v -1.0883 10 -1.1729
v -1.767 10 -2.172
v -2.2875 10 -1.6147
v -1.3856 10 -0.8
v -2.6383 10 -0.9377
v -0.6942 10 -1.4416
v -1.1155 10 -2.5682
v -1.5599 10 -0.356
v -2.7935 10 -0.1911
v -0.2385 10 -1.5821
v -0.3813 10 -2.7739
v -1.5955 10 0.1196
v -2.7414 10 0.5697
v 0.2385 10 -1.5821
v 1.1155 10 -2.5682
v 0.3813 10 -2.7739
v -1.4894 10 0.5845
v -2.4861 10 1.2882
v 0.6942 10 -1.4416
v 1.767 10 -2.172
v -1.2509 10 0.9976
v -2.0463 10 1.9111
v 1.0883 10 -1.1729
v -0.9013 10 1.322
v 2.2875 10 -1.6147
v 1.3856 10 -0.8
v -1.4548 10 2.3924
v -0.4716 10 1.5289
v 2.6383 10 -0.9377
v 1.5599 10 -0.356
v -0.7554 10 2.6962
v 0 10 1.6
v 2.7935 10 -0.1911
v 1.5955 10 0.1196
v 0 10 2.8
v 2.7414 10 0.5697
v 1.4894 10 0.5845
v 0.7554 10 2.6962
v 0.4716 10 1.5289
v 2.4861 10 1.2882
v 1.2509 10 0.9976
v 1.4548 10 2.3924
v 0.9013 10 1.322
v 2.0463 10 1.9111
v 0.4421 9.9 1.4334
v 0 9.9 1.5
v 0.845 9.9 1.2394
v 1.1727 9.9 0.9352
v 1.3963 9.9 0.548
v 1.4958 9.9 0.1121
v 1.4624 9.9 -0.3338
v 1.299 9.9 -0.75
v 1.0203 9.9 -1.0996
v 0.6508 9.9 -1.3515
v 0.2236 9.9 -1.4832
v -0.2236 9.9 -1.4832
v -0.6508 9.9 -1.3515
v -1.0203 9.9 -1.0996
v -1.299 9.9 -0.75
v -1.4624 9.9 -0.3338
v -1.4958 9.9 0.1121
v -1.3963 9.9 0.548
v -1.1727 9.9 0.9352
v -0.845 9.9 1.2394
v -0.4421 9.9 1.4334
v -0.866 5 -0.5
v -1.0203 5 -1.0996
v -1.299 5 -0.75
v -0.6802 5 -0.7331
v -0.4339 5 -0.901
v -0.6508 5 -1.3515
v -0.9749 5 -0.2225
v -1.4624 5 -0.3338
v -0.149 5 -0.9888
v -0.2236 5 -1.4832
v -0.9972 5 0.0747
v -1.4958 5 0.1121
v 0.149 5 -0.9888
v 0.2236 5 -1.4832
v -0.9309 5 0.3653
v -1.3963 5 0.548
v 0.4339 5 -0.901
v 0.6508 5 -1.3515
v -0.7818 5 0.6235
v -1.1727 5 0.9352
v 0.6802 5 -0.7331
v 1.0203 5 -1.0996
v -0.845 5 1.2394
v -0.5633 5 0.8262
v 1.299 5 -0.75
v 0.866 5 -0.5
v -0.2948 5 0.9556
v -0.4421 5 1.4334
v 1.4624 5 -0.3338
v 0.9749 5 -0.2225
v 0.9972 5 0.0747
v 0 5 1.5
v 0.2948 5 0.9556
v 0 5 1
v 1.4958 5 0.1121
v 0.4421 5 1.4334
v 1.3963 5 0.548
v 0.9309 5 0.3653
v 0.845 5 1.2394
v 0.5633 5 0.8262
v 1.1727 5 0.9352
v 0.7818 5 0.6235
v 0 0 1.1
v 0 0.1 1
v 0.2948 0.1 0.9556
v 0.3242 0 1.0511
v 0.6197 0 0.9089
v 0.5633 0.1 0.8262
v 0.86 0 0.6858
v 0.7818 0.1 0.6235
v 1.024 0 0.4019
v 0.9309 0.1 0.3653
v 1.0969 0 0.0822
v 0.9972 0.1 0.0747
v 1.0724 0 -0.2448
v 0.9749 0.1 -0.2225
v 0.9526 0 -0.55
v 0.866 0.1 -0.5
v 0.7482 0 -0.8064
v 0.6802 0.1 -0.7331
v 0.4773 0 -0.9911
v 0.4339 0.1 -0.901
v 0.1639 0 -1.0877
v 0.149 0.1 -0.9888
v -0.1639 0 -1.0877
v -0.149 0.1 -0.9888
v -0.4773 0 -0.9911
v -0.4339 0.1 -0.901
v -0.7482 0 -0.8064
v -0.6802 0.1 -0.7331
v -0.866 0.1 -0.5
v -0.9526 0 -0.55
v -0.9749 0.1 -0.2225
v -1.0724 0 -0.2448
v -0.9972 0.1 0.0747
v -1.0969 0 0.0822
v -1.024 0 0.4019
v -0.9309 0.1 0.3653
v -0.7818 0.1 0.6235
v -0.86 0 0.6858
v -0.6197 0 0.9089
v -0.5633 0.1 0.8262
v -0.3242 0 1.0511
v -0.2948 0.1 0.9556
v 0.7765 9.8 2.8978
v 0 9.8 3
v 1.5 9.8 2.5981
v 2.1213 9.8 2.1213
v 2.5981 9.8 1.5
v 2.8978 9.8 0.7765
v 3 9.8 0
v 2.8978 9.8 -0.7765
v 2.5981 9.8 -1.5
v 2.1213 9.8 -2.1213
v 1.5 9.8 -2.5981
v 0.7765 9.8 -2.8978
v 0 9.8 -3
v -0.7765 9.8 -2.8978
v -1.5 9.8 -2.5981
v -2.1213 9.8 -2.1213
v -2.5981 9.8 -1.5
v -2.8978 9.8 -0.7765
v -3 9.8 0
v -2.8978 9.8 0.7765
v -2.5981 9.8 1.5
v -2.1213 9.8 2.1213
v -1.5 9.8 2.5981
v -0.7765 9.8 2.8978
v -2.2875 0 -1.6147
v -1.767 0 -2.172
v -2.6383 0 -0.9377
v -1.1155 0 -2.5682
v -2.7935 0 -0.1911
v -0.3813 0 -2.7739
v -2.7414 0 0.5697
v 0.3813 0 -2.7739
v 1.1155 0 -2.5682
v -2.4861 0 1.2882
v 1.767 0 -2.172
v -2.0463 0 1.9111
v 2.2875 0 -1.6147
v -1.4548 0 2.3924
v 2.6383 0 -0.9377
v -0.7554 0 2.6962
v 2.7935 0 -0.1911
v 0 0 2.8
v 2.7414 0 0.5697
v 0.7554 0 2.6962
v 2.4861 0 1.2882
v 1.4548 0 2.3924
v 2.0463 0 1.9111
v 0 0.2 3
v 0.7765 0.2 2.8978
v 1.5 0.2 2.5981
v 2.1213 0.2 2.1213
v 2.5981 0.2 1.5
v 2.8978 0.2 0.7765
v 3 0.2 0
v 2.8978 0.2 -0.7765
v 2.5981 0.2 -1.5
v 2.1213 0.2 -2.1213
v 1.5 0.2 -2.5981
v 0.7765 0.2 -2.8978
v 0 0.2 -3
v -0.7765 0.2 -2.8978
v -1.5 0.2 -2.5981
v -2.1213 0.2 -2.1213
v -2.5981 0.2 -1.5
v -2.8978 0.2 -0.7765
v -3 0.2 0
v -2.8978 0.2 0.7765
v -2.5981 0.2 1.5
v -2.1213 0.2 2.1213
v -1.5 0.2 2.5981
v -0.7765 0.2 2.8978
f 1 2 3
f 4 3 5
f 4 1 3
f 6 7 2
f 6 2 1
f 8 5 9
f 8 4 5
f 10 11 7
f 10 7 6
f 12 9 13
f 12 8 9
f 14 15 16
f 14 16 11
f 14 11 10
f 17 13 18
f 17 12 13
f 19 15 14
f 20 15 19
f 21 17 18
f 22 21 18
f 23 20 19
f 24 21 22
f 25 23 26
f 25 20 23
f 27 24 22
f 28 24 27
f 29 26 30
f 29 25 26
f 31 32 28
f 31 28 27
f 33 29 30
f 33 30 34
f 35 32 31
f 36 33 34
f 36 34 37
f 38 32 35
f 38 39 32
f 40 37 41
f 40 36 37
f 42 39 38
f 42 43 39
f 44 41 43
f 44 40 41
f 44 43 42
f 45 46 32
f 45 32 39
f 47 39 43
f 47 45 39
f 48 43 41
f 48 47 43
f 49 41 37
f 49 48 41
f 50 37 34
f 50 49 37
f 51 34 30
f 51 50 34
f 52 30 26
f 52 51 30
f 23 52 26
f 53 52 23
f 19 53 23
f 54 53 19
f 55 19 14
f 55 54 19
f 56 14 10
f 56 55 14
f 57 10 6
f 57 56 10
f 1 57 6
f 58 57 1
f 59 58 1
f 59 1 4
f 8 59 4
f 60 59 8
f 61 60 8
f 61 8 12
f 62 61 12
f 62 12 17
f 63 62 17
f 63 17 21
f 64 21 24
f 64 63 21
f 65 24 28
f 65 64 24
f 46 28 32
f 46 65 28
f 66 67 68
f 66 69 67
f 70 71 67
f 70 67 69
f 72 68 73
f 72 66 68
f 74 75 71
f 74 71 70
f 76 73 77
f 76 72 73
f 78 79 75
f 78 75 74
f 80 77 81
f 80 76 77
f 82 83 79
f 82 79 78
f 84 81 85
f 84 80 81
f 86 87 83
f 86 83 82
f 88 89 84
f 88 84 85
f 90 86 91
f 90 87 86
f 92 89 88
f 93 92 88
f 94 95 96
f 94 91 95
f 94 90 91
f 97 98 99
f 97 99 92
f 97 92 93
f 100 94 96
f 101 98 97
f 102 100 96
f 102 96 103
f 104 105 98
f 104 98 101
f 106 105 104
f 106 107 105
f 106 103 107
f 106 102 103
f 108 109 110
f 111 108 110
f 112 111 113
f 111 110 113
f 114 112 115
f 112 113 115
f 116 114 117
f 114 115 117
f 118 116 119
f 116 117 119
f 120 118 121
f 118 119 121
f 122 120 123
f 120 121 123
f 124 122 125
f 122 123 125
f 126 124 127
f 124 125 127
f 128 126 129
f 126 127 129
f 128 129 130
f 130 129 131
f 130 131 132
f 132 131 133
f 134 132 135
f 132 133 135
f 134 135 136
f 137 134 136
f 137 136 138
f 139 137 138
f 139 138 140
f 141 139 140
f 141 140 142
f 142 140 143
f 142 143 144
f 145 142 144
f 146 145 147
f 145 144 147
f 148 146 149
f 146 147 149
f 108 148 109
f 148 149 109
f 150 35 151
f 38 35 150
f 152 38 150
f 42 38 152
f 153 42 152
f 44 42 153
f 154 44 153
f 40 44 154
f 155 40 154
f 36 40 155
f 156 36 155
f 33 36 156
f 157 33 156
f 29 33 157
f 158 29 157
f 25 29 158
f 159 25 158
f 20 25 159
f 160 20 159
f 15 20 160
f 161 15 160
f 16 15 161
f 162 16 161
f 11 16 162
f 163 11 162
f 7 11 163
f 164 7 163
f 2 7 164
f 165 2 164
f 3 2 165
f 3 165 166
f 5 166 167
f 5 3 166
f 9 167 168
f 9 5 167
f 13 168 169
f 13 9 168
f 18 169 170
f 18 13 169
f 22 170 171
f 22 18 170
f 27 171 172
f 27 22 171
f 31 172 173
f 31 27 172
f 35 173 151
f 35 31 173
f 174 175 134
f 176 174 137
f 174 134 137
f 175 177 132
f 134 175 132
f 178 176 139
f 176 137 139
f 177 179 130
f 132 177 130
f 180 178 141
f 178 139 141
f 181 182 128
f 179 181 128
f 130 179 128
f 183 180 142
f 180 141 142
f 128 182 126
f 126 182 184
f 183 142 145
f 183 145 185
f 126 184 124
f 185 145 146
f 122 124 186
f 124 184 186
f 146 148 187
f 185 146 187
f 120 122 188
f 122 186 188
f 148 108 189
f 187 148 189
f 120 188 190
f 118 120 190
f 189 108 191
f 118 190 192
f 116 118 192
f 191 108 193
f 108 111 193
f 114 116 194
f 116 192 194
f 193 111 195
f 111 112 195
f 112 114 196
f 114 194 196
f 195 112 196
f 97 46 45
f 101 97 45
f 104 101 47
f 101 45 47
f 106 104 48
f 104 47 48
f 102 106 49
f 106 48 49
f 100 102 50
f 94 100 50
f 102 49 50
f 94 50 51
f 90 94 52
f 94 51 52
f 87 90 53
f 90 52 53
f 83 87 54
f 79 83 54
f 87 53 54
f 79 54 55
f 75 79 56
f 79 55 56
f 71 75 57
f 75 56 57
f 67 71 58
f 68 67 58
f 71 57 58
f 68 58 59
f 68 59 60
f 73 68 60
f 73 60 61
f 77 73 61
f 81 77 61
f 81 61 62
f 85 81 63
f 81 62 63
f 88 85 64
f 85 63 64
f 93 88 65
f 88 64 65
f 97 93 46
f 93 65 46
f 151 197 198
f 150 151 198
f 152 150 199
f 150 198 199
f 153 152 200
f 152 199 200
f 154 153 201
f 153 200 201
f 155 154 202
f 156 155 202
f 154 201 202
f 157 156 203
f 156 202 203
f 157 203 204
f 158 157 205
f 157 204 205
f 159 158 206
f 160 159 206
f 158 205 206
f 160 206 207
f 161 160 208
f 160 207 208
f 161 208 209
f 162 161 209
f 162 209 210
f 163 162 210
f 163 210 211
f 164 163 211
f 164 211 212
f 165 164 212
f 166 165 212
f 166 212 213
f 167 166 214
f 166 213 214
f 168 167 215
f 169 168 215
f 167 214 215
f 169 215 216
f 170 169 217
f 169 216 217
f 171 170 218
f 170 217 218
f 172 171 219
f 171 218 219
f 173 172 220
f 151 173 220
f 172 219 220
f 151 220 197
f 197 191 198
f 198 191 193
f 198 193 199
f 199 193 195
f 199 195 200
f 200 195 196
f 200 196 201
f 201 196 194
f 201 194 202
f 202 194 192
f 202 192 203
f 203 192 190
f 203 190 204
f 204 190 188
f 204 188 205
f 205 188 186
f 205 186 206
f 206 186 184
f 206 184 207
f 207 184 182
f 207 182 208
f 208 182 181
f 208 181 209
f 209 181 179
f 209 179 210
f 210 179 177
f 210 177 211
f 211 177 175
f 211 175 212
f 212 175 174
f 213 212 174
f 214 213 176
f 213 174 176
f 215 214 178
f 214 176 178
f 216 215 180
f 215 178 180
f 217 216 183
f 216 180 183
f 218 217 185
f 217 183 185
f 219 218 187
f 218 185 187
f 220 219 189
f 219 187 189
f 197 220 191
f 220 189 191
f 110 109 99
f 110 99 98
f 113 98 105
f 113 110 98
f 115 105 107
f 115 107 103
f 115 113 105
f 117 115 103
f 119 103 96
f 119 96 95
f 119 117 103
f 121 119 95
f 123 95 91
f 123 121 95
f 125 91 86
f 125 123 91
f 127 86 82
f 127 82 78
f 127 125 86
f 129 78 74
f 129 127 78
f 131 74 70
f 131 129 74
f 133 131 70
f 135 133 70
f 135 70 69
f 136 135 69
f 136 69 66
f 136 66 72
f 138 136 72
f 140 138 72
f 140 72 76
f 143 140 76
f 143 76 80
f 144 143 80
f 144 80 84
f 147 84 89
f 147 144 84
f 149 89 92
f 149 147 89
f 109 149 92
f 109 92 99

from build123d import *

# Parameters (mm, degrees)
SKETCH_1_R          = 3
EXTRUDE_1_DEPTH     = 10
SKETCH_2_R          = 1
CUT_EXTRUDE_1_DEPTH = 5
CUT_EXTRUDE_START   = 10
SKETCH_3_R          = 1.5
CUT_EXTRUDE_2_DEPTH = 5
CHAMFER_1_SIZE      = 0.2
CHAMFER_2_SIZE      = 0.1


with BuildPart() as part:
    # 草图1 → 凸台-拉伸1 (new body)
    with BuildSketch(Plane(origin=(0, 0, 0), x_dir=(1, 0, 0), z_dir=(0, 1, 0))):
        with Locations(Location((0, 0, 0), (0, 0, 270))):
            Circle(SKETCH_1_R)
    extrude(amount=EXTRUDE_1_DEPTH)

    # 草图2 → 切除-拉伸1 (cut)
    with BuildSketch(Plane(origin=(0, 0, 0), x_dir=(1, 0, 0), z_dir=(0, 1, 0))):
        with Locations(Location((0, 0, 0), (0, 0, 270))):
            Circle(SKETCH_2_R)
    extrude(amount=CUT_EXTRUDE_1_DEPTH, mode=Mode.SUBTRACT)

    # 草图3 → 切除-拉伸2 (cut)
    with BuildSketch(Plane(origin=(0, 0, 0), x_dir=(1, 0, 0), z_dir=(0, 1, 0)).offset(CUT_EXTRUDE_START)):
        with Locations(Location((0, 0, 0), (0, 0, 270))):
            Circle(SKETCH_3_R)
    extrude(amount=-CUT_EXTRUDE_2_DEPTH, mode=Mode.SUBTRACT)

    # 倒角1
    chamfer_1_edges = [part.edges().sort_by_distance(p)[0] for p in [
        (0, 0, -3),
        (0, 10, -3),
    ]]
    chamfer(chamfer_1_edges, length=CHAMFER_1_SIZE)

    # 倒角2
    chamfer_2_edges = [part.edges().sort_by_distance(p)[0] for p in [
        (0, 10, -1.5),
        (0, 0, -1),
    ]]
    chamfer(chamfer_2_edges, length=CHAMFER_2_SIZE)


solid = part.part
